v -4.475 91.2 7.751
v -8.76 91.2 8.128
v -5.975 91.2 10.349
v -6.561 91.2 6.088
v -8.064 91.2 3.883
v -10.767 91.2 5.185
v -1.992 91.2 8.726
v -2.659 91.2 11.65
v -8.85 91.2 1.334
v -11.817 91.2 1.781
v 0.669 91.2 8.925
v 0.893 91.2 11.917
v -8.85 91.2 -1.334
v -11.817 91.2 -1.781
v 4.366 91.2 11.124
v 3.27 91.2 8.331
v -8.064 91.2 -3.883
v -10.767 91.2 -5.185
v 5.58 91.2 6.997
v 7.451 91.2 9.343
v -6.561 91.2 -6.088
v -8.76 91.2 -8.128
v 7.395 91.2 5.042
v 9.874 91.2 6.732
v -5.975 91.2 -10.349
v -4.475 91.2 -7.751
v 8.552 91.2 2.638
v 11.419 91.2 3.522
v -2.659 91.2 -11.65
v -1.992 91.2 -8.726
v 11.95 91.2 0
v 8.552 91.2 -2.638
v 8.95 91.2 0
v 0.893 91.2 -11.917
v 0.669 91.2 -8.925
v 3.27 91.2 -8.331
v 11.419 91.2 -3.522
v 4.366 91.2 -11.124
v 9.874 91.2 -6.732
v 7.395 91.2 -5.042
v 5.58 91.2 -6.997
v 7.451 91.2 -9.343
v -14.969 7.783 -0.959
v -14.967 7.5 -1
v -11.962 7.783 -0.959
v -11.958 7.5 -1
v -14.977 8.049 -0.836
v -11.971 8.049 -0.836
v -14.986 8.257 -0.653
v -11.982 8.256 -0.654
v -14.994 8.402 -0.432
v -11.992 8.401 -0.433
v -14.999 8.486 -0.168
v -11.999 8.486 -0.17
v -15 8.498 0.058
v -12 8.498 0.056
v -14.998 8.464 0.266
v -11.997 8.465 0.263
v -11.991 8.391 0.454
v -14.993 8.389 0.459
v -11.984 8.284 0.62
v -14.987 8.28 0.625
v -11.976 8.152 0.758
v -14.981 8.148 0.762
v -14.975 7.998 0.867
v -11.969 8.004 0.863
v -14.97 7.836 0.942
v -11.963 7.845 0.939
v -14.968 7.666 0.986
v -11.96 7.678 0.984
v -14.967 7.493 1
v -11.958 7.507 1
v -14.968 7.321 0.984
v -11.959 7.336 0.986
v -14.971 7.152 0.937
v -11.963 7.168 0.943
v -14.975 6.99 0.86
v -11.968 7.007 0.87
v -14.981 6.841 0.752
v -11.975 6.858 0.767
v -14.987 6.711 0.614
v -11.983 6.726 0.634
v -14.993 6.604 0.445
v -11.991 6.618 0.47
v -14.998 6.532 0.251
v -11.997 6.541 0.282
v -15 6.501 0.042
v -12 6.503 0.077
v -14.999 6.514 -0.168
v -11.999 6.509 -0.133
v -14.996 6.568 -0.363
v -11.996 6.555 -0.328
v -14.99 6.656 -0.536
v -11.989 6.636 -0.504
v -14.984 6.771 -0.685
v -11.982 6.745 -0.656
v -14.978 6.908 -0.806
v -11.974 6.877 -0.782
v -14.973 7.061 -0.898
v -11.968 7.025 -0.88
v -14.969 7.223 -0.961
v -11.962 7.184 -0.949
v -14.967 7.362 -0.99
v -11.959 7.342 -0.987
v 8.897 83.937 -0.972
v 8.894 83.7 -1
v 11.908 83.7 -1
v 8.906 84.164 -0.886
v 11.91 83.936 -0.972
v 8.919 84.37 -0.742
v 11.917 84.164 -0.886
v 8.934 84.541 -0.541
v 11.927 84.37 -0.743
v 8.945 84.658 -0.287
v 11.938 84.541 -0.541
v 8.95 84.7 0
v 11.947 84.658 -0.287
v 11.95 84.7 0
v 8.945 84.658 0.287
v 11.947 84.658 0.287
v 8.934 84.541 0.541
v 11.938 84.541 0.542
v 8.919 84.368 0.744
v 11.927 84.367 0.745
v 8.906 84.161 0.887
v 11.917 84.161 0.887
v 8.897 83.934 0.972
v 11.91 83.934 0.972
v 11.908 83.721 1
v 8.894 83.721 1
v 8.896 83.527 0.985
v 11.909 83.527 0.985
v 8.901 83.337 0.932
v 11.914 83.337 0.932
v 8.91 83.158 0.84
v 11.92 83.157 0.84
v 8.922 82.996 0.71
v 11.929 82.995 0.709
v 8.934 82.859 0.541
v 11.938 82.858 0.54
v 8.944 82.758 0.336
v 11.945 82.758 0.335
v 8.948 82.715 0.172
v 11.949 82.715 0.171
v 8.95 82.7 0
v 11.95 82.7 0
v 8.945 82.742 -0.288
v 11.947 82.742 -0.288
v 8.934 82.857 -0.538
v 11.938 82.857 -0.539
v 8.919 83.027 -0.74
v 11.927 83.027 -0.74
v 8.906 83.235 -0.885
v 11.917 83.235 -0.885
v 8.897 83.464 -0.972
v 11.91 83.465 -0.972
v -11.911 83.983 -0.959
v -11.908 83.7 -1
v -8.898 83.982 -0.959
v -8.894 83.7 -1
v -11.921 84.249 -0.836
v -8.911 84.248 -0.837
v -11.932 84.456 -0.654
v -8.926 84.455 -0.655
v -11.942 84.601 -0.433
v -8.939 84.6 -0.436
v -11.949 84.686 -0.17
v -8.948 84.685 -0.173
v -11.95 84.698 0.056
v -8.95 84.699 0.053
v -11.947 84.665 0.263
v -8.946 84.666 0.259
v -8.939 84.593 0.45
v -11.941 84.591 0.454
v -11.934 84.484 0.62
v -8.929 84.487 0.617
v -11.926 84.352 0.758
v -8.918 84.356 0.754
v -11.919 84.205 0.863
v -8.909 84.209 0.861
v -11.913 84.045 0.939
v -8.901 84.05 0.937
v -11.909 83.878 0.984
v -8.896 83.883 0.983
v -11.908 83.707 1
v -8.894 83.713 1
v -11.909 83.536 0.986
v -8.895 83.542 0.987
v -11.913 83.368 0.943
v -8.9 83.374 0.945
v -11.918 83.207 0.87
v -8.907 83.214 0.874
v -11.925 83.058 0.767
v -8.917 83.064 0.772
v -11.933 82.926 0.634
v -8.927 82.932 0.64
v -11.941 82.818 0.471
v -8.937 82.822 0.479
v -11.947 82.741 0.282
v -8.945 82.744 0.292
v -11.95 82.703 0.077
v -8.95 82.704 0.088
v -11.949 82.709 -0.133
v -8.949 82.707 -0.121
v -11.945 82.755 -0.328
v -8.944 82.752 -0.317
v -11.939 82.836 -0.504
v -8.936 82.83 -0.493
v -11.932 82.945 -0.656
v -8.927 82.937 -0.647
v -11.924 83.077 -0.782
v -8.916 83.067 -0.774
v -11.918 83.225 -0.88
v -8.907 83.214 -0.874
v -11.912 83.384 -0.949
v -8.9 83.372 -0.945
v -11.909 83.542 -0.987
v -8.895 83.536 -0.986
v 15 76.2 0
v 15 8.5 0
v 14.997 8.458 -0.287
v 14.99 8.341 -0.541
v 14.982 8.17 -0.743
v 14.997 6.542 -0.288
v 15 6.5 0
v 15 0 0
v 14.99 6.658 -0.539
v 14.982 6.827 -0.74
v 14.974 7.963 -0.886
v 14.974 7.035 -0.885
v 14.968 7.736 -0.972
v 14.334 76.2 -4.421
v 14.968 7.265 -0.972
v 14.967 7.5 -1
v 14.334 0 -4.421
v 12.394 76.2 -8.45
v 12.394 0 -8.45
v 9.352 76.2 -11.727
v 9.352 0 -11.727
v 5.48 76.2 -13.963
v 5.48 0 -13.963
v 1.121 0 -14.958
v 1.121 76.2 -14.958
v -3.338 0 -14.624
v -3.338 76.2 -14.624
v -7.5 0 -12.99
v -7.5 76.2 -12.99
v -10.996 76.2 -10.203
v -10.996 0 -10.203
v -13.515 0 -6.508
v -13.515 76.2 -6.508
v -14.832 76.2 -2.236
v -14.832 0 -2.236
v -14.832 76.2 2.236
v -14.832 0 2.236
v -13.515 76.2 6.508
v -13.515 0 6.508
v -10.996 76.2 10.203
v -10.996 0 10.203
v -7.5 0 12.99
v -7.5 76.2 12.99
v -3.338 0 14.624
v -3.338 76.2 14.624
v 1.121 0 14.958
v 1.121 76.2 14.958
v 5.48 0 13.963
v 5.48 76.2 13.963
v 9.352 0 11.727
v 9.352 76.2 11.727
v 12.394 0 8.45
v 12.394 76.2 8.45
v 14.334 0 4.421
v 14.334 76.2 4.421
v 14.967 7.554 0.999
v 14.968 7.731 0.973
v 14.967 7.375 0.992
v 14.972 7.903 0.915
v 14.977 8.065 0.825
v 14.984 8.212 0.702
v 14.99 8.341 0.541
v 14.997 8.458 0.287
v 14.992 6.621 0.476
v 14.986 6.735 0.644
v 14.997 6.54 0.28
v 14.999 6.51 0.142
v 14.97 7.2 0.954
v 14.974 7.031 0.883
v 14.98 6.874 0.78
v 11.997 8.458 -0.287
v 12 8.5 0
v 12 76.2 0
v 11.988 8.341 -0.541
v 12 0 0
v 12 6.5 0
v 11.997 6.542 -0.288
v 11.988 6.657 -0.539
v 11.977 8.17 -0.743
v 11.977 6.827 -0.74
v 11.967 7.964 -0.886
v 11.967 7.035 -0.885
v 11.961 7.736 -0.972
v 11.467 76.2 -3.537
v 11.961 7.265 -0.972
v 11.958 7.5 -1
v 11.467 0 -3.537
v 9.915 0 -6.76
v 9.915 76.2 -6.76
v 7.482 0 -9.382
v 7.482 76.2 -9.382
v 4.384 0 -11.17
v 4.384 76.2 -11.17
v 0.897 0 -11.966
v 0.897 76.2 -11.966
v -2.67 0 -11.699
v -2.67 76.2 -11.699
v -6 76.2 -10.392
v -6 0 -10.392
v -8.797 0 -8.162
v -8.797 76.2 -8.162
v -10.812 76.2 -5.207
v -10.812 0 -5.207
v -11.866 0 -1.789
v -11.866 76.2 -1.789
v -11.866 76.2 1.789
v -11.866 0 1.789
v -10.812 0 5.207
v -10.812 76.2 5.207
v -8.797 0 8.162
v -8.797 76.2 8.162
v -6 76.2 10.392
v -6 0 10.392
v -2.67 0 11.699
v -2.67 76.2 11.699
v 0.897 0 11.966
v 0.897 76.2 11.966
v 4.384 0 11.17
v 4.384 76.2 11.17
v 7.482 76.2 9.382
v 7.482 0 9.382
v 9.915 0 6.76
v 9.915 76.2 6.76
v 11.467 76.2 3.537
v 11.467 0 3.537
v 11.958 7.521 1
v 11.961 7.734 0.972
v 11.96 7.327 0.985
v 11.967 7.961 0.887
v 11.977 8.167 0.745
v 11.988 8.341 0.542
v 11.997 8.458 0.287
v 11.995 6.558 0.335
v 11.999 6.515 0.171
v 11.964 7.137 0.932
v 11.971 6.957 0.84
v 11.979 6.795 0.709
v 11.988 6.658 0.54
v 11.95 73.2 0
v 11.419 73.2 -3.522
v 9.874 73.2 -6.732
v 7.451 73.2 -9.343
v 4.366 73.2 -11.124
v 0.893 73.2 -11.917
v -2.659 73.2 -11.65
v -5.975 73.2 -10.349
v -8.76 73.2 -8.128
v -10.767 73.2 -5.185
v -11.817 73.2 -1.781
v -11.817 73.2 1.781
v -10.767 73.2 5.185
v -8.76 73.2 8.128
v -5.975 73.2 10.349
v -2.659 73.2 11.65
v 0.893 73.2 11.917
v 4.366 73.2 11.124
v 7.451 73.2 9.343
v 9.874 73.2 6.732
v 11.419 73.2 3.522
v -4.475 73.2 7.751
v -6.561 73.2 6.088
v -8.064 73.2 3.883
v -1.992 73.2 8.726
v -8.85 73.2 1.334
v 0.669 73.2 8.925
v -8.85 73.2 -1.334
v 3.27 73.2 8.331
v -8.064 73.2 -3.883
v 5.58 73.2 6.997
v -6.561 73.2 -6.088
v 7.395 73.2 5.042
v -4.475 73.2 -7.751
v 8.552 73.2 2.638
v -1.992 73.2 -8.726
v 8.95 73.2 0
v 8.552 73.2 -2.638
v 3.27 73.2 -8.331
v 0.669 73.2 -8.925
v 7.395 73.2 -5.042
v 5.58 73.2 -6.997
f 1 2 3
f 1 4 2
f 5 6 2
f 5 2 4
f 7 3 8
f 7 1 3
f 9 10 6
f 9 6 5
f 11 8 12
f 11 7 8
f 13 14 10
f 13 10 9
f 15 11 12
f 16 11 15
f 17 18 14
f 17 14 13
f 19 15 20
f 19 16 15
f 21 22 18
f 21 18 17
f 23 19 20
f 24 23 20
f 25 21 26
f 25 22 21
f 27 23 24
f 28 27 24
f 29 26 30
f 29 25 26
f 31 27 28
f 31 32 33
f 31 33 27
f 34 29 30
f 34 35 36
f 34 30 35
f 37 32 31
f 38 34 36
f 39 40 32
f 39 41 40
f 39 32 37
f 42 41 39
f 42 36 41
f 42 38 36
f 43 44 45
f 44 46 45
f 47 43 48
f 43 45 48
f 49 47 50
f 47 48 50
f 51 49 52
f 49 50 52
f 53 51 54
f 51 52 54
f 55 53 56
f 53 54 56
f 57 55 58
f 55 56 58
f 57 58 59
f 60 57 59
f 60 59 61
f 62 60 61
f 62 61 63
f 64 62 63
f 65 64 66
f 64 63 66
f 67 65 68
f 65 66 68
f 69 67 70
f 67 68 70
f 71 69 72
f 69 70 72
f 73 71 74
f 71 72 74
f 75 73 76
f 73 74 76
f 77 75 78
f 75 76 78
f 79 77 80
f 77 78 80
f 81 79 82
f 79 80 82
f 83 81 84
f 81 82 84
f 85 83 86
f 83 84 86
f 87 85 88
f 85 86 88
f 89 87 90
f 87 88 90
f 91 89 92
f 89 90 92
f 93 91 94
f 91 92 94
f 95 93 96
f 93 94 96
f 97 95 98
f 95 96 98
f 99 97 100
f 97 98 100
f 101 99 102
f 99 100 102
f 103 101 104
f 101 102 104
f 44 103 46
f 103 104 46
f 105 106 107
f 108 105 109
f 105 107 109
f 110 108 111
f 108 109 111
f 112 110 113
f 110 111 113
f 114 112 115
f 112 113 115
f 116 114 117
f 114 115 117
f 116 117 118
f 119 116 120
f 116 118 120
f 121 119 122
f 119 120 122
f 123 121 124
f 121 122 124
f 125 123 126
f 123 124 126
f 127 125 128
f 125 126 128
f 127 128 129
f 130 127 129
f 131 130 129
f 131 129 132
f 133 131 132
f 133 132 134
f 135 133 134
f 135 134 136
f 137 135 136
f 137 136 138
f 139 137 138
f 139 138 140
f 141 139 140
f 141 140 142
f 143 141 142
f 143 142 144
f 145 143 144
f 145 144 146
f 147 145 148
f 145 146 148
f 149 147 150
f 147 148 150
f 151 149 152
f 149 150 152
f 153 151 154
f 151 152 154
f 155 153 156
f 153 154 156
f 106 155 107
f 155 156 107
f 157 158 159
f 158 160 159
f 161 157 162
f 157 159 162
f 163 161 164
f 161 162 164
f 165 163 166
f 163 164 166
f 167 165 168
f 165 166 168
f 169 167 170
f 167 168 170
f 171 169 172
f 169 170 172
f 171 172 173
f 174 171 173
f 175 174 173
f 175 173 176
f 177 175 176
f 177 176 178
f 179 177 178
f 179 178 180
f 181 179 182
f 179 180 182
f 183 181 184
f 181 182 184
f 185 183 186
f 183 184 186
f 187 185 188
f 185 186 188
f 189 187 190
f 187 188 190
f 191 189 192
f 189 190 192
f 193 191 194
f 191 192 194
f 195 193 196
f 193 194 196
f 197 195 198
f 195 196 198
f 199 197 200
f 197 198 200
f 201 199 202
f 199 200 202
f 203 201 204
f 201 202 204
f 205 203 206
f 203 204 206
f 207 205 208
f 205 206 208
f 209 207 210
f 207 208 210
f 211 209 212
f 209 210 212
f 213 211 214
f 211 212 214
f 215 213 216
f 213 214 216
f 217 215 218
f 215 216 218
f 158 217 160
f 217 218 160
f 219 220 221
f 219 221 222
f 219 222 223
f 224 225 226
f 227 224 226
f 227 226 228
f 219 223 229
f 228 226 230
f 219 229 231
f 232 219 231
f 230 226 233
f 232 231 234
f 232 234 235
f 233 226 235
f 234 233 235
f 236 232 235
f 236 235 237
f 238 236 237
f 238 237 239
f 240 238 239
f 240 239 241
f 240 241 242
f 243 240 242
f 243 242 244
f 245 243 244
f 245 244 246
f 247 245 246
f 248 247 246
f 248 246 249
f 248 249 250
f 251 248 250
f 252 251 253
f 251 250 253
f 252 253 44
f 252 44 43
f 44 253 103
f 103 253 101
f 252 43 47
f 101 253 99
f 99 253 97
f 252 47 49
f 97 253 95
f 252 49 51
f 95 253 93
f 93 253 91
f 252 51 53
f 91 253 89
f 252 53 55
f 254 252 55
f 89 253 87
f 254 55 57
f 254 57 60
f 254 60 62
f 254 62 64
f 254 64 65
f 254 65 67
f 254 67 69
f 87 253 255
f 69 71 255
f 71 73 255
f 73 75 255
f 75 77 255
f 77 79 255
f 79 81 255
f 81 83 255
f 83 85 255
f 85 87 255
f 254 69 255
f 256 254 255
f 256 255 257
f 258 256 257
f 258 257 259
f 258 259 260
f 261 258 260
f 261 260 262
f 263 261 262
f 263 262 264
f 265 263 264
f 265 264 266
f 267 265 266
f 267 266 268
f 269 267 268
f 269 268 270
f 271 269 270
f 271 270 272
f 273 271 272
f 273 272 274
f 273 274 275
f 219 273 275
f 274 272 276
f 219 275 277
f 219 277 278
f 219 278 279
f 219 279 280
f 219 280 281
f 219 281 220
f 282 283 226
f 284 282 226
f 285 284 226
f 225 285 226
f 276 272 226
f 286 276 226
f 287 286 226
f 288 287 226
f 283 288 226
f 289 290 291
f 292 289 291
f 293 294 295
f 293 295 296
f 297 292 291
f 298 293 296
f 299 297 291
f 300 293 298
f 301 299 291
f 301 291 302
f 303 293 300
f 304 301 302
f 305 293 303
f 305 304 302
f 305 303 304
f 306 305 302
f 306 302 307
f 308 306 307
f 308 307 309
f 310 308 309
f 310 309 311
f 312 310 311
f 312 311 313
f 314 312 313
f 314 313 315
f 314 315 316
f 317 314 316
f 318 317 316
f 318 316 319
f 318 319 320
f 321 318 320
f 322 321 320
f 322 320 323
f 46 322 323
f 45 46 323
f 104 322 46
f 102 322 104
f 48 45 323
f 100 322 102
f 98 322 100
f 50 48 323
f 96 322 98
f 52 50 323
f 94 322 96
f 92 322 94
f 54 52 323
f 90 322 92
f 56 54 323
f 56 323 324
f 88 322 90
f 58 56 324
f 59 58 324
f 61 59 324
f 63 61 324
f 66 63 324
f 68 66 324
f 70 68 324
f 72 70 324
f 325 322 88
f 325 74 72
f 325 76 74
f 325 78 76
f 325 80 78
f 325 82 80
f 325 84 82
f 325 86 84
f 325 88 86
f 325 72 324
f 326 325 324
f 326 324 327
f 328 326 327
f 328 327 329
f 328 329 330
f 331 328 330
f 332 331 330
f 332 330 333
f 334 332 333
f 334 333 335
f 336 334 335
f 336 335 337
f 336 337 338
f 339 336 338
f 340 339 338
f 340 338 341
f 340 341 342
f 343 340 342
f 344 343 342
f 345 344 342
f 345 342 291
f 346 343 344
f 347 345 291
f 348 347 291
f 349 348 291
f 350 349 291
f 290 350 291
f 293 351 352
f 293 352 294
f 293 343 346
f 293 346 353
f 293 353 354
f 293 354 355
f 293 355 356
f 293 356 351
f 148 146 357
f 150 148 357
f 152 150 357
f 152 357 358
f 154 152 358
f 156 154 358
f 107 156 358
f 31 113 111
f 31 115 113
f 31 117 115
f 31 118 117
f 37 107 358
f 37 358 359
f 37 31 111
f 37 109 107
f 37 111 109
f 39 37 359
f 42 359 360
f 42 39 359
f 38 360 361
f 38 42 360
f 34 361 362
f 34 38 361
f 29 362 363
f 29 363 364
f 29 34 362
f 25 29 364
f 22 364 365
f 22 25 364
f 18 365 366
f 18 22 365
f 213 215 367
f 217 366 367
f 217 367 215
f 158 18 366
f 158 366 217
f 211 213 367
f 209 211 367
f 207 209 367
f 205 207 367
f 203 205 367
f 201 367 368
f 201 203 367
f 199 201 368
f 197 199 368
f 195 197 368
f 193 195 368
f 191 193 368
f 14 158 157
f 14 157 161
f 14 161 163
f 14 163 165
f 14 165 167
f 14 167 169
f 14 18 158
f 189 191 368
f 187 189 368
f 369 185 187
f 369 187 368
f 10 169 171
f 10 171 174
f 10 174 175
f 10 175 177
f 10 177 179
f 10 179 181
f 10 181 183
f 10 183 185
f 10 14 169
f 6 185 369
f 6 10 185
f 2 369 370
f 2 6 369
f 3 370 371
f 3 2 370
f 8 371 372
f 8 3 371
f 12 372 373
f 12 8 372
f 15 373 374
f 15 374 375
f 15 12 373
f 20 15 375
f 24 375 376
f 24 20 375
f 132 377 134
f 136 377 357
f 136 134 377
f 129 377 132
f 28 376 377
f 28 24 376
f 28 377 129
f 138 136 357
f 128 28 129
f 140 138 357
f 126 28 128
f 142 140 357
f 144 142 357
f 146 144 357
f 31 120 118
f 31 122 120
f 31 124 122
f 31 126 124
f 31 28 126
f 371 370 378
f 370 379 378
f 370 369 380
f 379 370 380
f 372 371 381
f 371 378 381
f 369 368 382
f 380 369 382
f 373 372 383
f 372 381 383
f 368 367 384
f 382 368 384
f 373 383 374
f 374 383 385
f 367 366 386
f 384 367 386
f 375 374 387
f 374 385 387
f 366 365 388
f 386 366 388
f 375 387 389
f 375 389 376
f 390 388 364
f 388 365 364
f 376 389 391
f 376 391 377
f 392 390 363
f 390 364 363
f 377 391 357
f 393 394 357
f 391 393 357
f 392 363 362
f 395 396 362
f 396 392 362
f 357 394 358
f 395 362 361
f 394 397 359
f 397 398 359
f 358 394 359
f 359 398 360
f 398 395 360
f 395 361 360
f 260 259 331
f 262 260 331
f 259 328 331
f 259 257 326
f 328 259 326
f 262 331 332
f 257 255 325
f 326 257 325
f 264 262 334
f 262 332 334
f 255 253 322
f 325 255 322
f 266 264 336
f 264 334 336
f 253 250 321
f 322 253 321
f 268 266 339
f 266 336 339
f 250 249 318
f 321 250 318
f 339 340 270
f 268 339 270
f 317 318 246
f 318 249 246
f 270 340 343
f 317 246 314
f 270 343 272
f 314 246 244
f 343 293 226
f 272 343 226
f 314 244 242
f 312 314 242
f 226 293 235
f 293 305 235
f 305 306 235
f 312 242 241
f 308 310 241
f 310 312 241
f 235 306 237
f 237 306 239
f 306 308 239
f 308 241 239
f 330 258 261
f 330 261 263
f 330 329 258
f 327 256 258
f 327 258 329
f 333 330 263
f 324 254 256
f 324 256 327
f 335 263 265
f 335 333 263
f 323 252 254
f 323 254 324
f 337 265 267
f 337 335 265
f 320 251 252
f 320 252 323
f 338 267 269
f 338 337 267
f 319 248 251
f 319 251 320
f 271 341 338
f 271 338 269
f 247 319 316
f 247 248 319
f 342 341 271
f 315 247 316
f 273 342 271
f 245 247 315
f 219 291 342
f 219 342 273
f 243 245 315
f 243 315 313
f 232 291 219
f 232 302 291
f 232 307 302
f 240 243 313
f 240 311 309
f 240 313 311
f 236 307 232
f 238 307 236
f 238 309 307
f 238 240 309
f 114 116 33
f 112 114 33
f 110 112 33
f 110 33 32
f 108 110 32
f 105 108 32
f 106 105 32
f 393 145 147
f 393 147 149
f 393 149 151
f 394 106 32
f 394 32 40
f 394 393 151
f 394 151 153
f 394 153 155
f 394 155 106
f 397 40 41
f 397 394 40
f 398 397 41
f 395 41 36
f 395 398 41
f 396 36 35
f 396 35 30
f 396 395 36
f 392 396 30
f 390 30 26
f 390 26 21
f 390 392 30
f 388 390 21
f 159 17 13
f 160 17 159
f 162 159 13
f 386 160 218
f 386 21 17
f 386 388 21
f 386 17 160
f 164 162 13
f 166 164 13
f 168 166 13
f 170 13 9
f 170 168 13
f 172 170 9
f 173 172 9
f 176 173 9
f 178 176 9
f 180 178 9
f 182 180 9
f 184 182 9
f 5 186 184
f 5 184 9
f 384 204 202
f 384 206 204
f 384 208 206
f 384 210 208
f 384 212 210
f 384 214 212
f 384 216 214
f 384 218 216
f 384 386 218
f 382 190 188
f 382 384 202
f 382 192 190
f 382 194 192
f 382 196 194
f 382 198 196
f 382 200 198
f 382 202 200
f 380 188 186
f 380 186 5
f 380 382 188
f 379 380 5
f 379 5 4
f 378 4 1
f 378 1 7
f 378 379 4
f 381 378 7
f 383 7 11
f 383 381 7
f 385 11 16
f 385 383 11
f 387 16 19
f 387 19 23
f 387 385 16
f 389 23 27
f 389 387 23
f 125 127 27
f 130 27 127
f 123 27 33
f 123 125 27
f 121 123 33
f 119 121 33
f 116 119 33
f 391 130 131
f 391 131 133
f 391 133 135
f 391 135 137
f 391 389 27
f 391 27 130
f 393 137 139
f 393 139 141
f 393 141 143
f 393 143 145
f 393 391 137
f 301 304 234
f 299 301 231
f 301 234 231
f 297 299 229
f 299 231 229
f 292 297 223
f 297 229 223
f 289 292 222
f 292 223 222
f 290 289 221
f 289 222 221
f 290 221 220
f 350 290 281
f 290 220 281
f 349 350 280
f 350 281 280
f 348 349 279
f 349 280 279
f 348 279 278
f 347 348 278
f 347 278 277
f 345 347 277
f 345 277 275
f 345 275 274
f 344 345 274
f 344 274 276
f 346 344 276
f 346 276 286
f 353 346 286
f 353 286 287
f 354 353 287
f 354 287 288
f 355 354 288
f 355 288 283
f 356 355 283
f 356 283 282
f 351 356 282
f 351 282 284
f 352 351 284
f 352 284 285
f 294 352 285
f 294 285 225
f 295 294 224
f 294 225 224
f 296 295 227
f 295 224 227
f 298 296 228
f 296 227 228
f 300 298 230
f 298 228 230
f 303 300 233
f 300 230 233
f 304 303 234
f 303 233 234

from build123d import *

# Parameters (mm, degrees)
SKETCH1_R                = 15
SKETCH1_R_2              = 12
BOSS_EXTRUDE1_DEPTH      = 76.2
SKETCH2_R                = 11.95
SKETCH2_R_2              = 8.95
BOSS_EXTRUDE2_DEPTH      = 15
BOSS_EXTRUDE2_DEPTH_BACK = 3
SKETCH3_R                = 1
CUT_EXTRUDE1_DEPTH       = 16
CUT_EXTRUDE1_DEPTH_BACK  = 16


with BuildPart() as part:
    # Sketch1 → Boss-Extrude1 (new body)
    with BuildSketch(Plane(origin=(0, 0, 0), x_dir=(1, 0, 0), z_dir=(0, 1, 0))):
        Circle(SKETCH1_R)
        Circle(SKETCH1_R_2, mode=Mode.SUBTRACT)
    extrude(amount=BOSS_EXTRUDE1_DEPTH)


with BuildPart() as body_2:
    # Sketch2 → Boss-Extrude2 (new body, two sides)
    with BuildSketch(Plane(origin=(0, 76.2, 0), x_dir=(1, 0, 0), z_dir=(0, 1, 0))) as boss_extrude2_sk:
        Circle(SKETCH2_R)
        Circle(SKETCH2_R_2, mode=Mode.SUBTRACT)
    extrude(amount=BOSS_EXTRUDE2_DEPTH)
    extrude(boss_extrude2_sk.sketch, amount=-BOSS_EXTRUDE2_DEPTH_BACK)


with BuildPart() as cut_extrude1_tool:
    # Sketch3 → Cut-Extrude1 (new body, two sides)
    with BuildSketch(Plane(origin=(0, 0, 0), x_dir=(0, 0, -1), z_dir=(1, 0, 0))) as cut_extrude1_sk:
        with Locations((0, 83.7)):
            Circle(SKETCH3_R)
        with Locations((0, 7.5)):
            Circle(SKETCH3_R)
    extrude(amount=CUT_EXTRUDE1_DEPTH)
    extrude(cut_extrude1_sk.sketch, amount=-CUT_EXTRUDE1_DEPTH_BACK)


with BuildPart() as part_1:
    add(part.part)

    # Cut-Extrude1: cut by cut_extrude1_tool
    add(cut_extrude1_tool.part, mode=Mode.SUBTRACT)


with BuildPart() as body_2_1:
    add(body_2.part)

    # Cut-Extrude1: cut by cut_extrude1_tool
    add(cut_extrude1_tool.part, mode=Mode.SUBTRACT)


solid = Compound([part_1.part, body_2_1.part])
